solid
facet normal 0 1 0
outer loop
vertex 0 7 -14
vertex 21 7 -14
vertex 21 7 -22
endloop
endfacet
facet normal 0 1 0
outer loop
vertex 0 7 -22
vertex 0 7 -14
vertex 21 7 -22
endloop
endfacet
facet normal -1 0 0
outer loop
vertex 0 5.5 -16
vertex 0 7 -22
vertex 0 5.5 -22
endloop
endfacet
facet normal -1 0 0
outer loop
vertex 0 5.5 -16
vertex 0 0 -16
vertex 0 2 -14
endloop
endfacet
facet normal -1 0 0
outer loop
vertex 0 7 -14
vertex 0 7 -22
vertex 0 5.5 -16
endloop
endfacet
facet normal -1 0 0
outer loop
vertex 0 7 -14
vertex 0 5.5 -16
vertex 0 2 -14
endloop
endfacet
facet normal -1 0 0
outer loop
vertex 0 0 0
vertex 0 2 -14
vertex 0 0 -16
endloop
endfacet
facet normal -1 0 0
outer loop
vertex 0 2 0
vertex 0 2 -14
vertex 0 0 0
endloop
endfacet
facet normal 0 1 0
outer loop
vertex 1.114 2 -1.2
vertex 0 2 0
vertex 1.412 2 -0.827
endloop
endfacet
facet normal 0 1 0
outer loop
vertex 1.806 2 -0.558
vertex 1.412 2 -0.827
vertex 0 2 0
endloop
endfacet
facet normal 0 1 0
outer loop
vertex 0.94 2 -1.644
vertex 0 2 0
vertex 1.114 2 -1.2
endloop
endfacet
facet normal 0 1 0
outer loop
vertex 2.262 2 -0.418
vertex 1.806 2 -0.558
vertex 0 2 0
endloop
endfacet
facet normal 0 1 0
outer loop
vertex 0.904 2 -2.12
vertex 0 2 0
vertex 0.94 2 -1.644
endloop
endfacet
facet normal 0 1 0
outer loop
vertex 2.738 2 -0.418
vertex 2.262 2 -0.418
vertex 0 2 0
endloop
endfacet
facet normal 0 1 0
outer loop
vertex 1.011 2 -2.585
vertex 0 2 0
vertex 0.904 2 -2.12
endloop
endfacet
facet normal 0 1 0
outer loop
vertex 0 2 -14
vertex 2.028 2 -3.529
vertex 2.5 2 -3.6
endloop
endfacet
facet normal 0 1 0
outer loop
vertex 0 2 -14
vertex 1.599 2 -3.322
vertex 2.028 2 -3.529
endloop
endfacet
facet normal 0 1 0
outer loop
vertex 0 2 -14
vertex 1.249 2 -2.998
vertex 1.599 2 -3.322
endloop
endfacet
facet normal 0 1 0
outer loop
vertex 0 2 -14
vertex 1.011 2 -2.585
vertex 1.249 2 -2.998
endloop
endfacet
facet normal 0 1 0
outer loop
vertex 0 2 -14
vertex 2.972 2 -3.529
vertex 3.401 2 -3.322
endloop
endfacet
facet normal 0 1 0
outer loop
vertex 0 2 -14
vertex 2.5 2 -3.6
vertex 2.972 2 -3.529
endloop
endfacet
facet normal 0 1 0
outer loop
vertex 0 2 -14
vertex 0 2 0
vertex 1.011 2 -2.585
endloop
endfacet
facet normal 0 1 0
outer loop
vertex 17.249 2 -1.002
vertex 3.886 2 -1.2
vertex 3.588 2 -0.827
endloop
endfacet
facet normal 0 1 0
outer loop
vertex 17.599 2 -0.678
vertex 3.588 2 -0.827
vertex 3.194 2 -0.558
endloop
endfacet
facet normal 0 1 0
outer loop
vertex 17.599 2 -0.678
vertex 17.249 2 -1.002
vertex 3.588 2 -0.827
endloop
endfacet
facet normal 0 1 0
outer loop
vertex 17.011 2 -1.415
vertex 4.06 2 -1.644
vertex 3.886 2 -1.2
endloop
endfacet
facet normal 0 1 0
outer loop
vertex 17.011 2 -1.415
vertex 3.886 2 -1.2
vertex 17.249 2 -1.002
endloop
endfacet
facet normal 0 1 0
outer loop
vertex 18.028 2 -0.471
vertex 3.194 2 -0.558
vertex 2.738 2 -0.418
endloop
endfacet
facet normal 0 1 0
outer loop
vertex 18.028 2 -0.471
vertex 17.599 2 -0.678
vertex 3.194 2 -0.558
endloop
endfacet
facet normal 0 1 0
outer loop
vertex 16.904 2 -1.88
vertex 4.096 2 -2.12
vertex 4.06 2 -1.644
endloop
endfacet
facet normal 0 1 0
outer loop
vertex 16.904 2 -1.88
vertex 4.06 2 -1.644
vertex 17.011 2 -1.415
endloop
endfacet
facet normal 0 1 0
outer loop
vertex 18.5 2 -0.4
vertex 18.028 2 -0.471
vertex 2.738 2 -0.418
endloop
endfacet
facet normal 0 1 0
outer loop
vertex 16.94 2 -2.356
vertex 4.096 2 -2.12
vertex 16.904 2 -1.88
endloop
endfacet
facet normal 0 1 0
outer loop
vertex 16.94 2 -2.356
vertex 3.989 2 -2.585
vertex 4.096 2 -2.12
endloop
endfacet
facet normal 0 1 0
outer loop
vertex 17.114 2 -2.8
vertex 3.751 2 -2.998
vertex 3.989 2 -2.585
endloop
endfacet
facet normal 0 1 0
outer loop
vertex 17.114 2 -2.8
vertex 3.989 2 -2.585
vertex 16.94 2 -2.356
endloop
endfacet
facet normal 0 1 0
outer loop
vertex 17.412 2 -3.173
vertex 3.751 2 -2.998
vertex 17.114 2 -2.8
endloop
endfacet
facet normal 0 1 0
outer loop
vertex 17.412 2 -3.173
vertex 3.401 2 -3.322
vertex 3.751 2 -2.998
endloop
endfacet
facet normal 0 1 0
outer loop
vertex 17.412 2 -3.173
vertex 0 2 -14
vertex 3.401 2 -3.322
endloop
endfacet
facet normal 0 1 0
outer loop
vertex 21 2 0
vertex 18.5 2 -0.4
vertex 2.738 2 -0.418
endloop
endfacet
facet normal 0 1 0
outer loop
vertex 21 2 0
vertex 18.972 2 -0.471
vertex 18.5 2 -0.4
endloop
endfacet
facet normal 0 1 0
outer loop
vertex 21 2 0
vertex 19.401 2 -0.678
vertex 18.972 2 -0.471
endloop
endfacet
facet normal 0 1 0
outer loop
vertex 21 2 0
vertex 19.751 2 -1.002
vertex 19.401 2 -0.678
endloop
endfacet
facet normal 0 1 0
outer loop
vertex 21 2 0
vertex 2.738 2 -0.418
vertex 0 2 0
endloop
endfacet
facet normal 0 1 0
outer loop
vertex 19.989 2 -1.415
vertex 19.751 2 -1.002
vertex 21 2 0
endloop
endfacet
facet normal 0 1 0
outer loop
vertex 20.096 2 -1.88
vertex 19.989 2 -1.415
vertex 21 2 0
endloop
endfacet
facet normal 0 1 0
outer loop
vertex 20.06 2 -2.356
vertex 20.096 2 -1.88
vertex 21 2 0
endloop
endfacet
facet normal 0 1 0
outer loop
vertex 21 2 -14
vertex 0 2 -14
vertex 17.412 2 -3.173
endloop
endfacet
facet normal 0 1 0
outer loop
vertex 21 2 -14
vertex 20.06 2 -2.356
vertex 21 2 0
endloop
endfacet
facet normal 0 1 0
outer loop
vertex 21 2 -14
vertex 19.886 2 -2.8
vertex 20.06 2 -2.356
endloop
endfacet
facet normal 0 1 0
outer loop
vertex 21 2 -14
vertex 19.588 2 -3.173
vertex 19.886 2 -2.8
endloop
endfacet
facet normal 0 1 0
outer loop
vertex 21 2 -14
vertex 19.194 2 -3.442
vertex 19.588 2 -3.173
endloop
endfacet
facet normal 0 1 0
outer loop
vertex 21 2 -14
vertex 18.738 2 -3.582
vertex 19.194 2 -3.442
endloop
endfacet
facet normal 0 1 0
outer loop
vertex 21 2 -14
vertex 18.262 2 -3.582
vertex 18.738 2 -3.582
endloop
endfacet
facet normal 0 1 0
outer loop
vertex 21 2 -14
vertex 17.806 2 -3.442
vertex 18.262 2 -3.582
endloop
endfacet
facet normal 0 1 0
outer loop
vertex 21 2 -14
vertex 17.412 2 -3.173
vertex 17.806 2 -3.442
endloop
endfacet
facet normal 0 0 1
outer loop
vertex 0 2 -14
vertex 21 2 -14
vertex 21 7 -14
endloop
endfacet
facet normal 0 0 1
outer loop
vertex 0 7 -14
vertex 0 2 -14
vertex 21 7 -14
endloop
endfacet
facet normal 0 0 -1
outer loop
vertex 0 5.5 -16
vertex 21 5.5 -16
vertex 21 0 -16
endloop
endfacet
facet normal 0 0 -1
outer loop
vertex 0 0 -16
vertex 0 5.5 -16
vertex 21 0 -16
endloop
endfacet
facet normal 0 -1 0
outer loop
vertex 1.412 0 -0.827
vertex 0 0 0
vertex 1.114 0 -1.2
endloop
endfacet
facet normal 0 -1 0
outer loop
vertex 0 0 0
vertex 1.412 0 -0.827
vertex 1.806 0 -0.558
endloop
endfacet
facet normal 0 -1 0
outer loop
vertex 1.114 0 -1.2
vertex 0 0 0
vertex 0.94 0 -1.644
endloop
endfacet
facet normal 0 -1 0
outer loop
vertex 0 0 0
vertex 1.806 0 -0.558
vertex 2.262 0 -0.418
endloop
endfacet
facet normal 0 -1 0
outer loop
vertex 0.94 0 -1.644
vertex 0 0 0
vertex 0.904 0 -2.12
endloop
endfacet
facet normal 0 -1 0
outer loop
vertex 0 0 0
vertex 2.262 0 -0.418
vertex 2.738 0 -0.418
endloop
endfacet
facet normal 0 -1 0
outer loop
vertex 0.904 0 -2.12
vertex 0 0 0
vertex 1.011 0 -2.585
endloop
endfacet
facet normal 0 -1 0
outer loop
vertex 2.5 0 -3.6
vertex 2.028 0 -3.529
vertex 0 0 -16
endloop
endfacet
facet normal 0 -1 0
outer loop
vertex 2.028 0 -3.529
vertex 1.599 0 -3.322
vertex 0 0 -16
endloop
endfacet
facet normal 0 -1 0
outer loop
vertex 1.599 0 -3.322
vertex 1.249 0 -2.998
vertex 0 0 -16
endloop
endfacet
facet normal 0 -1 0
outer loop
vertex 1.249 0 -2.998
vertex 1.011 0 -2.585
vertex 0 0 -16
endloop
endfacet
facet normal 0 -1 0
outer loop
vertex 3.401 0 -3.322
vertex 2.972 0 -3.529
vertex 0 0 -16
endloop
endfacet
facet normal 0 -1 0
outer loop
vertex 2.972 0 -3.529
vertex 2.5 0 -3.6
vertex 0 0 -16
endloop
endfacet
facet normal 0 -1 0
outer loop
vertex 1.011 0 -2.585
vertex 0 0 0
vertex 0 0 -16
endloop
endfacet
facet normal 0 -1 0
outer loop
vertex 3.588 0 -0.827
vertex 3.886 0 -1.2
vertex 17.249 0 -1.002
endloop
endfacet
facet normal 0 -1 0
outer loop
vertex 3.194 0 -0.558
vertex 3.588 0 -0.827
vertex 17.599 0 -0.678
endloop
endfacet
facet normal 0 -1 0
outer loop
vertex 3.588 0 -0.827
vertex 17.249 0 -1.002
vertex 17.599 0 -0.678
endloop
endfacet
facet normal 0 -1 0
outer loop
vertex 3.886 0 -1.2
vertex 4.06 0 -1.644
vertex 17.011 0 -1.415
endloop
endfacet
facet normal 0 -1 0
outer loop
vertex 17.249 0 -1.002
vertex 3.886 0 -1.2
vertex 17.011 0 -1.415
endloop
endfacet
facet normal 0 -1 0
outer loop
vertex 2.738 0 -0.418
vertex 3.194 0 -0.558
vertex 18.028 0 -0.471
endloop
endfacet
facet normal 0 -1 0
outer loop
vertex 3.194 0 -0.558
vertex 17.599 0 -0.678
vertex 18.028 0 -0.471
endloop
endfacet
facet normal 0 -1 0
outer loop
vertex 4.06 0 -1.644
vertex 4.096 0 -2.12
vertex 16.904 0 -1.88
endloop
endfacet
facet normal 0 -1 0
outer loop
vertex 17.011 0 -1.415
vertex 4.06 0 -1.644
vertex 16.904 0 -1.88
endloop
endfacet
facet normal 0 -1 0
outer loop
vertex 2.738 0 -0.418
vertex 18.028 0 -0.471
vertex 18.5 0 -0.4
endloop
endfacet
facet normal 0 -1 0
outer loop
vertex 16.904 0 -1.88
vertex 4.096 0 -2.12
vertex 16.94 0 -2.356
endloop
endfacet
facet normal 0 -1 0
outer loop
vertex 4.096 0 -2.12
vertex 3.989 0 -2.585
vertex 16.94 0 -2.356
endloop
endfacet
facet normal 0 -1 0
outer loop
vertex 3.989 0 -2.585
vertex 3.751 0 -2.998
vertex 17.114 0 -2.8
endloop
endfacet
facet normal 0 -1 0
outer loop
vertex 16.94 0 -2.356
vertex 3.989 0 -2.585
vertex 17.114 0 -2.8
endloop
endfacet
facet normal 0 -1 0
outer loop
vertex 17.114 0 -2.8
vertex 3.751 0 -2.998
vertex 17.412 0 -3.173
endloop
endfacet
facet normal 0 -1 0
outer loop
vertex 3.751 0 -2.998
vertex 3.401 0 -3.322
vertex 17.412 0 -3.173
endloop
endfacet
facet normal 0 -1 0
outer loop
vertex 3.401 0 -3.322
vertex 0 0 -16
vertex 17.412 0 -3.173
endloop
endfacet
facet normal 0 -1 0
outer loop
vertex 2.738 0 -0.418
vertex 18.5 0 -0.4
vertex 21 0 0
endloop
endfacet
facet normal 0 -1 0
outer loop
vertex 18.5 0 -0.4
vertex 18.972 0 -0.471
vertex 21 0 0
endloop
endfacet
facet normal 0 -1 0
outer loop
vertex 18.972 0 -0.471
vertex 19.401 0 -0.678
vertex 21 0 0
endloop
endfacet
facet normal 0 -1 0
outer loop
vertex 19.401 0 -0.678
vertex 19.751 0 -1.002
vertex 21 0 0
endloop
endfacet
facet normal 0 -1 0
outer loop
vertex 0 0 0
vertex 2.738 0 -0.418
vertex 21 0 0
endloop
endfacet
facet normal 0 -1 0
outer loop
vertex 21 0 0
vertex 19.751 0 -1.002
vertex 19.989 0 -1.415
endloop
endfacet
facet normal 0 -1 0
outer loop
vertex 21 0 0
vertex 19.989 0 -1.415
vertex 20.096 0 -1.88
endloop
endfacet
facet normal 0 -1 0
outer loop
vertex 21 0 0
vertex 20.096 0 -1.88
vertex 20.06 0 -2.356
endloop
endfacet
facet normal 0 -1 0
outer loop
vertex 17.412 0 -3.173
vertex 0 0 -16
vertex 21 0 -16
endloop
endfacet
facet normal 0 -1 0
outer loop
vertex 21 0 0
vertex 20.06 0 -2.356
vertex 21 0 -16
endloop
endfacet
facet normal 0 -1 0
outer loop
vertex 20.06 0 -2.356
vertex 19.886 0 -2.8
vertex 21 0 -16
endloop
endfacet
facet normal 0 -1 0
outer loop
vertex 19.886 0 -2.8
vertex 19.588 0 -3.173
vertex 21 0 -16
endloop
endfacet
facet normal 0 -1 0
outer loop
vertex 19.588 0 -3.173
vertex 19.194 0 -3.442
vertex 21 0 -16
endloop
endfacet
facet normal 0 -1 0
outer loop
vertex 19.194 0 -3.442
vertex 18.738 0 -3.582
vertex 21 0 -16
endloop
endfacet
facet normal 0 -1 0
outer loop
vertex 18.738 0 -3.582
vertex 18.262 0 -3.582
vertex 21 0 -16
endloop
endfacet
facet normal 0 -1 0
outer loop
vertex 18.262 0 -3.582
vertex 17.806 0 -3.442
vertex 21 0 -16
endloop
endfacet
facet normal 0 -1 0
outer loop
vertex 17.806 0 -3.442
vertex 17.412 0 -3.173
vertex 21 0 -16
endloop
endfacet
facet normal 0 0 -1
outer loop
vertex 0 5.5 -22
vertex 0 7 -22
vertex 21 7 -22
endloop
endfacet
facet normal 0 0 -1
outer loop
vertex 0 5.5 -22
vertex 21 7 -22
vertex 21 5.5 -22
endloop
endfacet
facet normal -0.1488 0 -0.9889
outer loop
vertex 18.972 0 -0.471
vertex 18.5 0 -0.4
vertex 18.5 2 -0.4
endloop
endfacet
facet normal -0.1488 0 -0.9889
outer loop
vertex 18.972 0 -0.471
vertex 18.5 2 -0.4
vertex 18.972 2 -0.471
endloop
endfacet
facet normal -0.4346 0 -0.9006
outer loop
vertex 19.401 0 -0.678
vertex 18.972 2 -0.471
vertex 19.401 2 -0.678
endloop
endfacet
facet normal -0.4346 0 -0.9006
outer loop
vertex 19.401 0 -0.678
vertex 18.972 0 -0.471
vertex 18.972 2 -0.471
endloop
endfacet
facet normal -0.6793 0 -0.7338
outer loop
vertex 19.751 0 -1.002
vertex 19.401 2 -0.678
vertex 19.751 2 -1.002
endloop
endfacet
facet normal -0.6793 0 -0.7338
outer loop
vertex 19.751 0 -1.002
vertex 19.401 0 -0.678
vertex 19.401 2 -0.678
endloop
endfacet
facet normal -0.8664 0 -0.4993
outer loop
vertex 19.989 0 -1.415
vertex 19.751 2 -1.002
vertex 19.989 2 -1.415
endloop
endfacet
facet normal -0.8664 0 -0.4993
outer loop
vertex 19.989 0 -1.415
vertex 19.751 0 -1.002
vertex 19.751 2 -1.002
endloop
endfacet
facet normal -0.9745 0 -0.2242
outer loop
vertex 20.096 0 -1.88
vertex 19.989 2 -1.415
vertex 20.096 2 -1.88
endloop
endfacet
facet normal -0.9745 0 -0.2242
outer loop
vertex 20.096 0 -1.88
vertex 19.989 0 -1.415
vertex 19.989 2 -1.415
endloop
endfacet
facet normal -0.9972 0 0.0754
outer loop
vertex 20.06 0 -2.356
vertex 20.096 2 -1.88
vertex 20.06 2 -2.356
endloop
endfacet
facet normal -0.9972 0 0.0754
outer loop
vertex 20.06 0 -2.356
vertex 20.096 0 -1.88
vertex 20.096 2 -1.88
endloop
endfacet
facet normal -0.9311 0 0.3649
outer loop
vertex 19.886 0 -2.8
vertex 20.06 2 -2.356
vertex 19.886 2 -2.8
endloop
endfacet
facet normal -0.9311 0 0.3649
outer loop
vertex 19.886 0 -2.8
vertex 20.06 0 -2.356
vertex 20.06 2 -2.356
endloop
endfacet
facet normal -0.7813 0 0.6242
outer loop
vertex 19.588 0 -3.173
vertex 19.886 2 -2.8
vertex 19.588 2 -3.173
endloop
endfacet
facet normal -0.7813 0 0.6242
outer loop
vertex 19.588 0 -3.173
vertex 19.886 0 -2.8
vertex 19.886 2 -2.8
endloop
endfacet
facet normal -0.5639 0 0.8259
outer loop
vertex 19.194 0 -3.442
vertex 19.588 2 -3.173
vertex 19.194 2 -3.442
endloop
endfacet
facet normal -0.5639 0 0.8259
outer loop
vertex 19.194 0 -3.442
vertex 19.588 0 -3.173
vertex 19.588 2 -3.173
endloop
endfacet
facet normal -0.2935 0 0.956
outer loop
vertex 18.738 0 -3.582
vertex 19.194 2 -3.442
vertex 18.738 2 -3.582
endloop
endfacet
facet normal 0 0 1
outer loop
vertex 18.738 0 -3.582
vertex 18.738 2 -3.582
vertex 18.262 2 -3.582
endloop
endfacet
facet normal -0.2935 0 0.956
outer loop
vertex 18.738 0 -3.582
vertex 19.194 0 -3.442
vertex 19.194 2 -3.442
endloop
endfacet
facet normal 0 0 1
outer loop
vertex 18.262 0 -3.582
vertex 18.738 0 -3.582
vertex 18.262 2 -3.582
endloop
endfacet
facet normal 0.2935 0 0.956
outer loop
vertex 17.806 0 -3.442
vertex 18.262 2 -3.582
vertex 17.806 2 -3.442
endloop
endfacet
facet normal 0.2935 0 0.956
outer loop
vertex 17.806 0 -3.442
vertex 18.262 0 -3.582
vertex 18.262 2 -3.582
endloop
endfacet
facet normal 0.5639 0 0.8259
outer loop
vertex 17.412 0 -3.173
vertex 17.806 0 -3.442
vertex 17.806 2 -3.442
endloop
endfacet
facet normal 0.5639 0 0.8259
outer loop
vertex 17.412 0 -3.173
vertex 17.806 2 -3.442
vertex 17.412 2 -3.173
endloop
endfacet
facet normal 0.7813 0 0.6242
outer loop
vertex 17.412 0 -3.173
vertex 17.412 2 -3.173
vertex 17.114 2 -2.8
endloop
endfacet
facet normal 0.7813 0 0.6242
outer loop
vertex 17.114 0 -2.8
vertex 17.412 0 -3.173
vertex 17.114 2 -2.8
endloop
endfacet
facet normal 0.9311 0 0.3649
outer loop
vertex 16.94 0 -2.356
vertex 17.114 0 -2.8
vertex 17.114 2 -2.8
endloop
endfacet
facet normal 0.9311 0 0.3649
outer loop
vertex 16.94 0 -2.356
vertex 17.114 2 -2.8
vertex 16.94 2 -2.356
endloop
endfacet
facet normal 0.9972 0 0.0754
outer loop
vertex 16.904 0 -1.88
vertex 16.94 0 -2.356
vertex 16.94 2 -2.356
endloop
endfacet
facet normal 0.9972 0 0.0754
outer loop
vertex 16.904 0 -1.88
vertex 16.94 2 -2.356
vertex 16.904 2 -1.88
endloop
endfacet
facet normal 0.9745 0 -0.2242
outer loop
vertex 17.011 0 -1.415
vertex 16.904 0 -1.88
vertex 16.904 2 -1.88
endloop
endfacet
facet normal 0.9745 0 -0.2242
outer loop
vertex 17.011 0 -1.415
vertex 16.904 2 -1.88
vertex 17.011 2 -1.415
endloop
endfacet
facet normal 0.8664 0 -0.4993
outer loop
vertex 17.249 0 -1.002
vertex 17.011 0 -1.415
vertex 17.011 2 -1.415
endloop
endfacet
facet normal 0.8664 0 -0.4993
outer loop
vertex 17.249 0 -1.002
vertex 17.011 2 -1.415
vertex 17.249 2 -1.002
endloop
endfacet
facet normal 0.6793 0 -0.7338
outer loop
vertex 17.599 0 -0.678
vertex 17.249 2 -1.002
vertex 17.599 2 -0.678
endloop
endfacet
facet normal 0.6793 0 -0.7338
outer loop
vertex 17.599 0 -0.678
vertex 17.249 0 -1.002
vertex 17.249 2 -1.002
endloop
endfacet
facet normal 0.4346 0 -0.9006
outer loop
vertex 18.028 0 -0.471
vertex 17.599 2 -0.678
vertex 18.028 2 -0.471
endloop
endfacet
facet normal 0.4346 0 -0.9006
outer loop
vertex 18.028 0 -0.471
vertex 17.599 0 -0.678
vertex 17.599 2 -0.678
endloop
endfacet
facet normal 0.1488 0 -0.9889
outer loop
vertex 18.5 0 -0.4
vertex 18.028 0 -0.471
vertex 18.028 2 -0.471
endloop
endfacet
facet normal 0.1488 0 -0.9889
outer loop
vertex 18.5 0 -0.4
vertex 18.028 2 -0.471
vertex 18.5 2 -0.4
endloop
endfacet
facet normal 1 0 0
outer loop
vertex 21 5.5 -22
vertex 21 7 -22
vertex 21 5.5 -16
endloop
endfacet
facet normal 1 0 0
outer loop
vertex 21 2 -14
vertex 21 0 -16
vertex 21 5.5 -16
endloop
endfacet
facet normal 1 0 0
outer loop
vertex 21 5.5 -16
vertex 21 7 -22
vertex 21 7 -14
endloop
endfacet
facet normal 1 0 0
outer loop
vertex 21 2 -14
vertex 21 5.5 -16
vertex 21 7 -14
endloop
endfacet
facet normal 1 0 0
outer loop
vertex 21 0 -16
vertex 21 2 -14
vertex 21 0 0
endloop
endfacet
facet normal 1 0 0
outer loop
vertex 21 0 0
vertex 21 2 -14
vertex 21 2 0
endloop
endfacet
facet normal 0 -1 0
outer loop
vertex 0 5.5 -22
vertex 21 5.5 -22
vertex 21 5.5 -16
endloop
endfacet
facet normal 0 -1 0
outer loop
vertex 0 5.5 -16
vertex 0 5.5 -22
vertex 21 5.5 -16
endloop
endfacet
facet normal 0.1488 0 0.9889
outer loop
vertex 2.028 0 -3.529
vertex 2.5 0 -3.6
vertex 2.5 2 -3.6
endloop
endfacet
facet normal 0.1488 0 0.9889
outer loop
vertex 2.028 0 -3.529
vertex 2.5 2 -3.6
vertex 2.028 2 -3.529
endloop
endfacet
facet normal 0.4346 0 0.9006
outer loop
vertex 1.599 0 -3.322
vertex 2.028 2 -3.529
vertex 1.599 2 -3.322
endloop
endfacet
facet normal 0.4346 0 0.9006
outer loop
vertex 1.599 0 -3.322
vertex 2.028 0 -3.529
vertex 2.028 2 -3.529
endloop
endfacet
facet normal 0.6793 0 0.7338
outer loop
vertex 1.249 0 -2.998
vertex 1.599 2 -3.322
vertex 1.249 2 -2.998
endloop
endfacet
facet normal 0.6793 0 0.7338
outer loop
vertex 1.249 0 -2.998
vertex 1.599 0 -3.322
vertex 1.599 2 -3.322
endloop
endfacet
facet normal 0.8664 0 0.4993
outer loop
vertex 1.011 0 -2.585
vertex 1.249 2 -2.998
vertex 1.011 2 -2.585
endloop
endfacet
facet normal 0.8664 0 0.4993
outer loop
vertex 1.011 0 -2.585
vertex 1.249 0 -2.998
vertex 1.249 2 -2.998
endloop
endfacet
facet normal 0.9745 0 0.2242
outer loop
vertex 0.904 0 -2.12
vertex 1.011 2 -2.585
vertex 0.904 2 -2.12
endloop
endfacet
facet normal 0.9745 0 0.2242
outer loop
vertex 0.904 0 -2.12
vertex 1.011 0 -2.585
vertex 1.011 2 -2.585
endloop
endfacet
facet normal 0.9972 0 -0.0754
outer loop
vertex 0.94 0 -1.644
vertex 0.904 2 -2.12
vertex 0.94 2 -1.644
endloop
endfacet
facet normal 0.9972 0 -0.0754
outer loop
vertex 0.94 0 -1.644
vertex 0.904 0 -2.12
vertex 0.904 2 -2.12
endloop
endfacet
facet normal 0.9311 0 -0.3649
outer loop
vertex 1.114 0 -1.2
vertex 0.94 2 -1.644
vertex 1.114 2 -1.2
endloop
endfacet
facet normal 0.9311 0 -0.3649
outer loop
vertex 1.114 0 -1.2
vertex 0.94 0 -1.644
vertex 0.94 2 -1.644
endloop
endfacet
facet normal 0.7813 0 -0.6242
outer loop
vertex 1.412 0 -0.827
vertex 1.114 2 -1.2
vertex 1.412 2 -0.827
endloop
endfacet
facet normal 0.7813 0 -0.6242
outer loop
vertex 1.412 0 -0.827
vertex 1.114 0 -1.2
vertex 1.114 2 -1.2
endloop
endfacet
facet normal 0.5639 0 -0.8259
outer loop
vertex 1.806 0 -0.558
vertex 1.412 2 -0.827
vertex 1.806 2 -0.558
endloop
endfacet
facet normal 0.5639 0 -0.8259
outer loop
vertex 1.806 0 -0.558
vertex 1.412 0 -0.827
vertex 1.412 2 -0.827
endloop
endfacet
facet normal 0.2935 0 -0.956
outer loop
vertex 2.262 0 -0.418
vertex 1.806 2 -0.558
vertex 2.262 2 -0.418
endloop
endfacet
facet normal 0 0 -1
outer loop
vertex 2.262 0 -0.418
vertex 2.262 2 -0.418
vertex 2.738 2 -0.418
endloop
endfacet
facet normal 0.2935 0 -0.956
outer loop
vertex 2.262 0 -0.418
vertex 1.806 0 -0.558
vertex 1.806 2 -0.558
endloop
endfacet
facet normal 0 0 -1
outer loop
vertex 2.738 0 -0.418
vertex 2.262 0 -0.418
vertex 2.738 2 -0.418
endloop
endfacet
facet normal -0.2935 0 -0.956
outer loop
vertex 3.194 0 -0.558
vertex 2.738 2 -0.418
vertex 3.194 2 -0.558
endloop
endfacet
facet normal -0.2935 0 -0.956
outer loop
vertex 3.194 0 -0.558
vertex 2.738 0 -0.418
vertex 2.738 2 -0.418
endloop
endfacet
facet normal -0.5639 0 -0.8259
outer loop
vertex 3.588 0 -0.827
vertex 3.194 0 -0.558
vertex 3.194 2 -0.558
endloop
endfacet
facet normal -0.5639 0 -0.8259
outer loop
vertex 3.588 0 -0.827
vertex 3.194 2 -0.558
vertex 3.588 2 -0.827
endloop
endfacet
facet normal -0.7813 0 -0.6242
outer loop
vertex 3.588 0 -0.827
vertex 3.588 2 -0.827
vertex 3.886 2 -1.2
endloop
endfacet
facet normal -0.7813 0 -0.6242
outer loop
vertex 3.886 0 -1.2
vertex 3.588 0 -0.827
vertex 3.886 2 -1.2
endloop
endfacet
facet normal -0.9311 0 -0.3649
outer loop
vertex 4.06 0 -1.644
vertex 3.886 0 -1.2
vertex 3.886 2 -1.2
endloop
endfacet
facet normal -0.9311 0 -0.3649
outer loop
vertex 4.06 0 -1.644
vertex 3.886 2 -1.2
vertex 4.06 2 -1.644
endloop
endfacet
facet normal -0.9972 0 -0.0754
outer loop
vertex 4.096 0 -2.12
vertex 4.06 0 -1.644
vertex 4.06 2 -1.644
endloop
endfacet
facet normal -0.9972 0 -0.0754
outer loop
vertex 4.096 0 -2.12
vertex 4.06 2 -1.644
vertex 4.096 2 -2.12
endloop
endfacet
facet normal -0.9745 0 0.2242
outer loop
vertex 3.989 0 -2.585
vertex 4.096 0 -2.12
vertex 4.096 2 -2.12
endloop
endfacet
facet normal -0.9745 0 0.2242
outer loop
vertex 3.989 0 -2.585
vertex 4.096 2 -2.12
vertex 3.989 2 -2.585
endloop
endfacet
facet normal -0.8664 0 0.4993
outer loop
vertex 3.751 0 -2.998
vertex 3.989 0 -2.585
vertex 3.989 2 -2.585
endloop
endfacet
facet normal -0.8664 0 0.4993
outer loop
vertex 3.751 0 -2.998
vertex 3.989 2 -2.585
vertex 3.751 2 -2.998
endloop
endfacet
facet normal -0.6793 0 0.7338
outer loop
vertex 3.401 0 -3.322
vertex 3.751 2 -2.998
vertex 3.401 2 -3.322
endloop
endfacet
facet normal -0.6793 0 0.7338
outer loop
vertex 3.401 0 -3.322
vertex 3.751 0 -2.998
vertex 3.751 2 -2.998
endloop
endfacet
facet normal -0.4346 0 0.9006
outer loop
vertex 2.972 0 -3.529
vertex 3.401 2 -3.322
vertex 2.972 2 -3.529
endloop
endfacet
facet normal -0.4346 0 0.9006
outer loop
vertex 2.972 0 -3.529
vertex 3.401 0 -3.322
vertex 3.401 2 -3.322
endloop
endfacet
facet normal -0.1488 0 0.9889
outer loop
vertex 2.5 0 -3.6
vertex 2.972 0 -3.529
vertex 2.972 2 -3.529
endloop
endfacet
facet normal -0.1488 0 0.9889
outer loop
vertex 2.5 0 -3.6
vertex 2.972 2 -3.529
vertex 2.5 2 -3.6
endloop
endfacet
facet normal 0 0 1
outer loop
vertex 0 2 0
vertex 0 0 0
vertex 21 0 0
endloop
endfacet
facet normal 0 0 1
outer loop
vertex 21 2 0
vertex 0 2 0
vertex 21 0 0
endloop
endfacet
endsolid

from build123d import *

# Parameters (mm, degrees)
SKETCH_1_W      = 21
SKETCH_1_H      = 16
SKETCH_1_R      = 1.6
EXTRUDE_1_DEPTH = 2
EXTRUDE_2_DEPTH = 21


with BuildPart() as part:
    # 草图1 → 凸台-拉伸1 (new body)
    with BuildSketch(Plane(origin=(0, 0, 0), x_dir=(1, 0, 0), z_dir=(0, 1, 0))):
        with Locations((10.5, 8)):
            Rectangle(SKETCH_1_W, SKETCH_1_H)
        with Locations(Location((18.5, 2, 0), (0, 0, 270))):
            Circle(SKETCH_1_R, mode=Mode.SUBTRACT)
        with Locations(Location((2.5, 2, 0), (0, 0, 90))):
            Circle(SKETCH_1_R, mode=Mode.SUBTRACT)
    extrude(amount=EXTRUDE_1_DEPTH)

    # 草图3 → 凸台-拉伸2 (add)
    with BuildSketch(Plane(origin=(21, 0, 0), x_dir=(0, 0, -1), z_dir=(1, 0, 0))):
        Polygon((16, 2), (14, 2), (14, 7), (22, 7), (22, 5.5), (16, 5.5), align=None)
    extrude(amount=-EXTRUDE_2_DEPTH)


solid = part.part
